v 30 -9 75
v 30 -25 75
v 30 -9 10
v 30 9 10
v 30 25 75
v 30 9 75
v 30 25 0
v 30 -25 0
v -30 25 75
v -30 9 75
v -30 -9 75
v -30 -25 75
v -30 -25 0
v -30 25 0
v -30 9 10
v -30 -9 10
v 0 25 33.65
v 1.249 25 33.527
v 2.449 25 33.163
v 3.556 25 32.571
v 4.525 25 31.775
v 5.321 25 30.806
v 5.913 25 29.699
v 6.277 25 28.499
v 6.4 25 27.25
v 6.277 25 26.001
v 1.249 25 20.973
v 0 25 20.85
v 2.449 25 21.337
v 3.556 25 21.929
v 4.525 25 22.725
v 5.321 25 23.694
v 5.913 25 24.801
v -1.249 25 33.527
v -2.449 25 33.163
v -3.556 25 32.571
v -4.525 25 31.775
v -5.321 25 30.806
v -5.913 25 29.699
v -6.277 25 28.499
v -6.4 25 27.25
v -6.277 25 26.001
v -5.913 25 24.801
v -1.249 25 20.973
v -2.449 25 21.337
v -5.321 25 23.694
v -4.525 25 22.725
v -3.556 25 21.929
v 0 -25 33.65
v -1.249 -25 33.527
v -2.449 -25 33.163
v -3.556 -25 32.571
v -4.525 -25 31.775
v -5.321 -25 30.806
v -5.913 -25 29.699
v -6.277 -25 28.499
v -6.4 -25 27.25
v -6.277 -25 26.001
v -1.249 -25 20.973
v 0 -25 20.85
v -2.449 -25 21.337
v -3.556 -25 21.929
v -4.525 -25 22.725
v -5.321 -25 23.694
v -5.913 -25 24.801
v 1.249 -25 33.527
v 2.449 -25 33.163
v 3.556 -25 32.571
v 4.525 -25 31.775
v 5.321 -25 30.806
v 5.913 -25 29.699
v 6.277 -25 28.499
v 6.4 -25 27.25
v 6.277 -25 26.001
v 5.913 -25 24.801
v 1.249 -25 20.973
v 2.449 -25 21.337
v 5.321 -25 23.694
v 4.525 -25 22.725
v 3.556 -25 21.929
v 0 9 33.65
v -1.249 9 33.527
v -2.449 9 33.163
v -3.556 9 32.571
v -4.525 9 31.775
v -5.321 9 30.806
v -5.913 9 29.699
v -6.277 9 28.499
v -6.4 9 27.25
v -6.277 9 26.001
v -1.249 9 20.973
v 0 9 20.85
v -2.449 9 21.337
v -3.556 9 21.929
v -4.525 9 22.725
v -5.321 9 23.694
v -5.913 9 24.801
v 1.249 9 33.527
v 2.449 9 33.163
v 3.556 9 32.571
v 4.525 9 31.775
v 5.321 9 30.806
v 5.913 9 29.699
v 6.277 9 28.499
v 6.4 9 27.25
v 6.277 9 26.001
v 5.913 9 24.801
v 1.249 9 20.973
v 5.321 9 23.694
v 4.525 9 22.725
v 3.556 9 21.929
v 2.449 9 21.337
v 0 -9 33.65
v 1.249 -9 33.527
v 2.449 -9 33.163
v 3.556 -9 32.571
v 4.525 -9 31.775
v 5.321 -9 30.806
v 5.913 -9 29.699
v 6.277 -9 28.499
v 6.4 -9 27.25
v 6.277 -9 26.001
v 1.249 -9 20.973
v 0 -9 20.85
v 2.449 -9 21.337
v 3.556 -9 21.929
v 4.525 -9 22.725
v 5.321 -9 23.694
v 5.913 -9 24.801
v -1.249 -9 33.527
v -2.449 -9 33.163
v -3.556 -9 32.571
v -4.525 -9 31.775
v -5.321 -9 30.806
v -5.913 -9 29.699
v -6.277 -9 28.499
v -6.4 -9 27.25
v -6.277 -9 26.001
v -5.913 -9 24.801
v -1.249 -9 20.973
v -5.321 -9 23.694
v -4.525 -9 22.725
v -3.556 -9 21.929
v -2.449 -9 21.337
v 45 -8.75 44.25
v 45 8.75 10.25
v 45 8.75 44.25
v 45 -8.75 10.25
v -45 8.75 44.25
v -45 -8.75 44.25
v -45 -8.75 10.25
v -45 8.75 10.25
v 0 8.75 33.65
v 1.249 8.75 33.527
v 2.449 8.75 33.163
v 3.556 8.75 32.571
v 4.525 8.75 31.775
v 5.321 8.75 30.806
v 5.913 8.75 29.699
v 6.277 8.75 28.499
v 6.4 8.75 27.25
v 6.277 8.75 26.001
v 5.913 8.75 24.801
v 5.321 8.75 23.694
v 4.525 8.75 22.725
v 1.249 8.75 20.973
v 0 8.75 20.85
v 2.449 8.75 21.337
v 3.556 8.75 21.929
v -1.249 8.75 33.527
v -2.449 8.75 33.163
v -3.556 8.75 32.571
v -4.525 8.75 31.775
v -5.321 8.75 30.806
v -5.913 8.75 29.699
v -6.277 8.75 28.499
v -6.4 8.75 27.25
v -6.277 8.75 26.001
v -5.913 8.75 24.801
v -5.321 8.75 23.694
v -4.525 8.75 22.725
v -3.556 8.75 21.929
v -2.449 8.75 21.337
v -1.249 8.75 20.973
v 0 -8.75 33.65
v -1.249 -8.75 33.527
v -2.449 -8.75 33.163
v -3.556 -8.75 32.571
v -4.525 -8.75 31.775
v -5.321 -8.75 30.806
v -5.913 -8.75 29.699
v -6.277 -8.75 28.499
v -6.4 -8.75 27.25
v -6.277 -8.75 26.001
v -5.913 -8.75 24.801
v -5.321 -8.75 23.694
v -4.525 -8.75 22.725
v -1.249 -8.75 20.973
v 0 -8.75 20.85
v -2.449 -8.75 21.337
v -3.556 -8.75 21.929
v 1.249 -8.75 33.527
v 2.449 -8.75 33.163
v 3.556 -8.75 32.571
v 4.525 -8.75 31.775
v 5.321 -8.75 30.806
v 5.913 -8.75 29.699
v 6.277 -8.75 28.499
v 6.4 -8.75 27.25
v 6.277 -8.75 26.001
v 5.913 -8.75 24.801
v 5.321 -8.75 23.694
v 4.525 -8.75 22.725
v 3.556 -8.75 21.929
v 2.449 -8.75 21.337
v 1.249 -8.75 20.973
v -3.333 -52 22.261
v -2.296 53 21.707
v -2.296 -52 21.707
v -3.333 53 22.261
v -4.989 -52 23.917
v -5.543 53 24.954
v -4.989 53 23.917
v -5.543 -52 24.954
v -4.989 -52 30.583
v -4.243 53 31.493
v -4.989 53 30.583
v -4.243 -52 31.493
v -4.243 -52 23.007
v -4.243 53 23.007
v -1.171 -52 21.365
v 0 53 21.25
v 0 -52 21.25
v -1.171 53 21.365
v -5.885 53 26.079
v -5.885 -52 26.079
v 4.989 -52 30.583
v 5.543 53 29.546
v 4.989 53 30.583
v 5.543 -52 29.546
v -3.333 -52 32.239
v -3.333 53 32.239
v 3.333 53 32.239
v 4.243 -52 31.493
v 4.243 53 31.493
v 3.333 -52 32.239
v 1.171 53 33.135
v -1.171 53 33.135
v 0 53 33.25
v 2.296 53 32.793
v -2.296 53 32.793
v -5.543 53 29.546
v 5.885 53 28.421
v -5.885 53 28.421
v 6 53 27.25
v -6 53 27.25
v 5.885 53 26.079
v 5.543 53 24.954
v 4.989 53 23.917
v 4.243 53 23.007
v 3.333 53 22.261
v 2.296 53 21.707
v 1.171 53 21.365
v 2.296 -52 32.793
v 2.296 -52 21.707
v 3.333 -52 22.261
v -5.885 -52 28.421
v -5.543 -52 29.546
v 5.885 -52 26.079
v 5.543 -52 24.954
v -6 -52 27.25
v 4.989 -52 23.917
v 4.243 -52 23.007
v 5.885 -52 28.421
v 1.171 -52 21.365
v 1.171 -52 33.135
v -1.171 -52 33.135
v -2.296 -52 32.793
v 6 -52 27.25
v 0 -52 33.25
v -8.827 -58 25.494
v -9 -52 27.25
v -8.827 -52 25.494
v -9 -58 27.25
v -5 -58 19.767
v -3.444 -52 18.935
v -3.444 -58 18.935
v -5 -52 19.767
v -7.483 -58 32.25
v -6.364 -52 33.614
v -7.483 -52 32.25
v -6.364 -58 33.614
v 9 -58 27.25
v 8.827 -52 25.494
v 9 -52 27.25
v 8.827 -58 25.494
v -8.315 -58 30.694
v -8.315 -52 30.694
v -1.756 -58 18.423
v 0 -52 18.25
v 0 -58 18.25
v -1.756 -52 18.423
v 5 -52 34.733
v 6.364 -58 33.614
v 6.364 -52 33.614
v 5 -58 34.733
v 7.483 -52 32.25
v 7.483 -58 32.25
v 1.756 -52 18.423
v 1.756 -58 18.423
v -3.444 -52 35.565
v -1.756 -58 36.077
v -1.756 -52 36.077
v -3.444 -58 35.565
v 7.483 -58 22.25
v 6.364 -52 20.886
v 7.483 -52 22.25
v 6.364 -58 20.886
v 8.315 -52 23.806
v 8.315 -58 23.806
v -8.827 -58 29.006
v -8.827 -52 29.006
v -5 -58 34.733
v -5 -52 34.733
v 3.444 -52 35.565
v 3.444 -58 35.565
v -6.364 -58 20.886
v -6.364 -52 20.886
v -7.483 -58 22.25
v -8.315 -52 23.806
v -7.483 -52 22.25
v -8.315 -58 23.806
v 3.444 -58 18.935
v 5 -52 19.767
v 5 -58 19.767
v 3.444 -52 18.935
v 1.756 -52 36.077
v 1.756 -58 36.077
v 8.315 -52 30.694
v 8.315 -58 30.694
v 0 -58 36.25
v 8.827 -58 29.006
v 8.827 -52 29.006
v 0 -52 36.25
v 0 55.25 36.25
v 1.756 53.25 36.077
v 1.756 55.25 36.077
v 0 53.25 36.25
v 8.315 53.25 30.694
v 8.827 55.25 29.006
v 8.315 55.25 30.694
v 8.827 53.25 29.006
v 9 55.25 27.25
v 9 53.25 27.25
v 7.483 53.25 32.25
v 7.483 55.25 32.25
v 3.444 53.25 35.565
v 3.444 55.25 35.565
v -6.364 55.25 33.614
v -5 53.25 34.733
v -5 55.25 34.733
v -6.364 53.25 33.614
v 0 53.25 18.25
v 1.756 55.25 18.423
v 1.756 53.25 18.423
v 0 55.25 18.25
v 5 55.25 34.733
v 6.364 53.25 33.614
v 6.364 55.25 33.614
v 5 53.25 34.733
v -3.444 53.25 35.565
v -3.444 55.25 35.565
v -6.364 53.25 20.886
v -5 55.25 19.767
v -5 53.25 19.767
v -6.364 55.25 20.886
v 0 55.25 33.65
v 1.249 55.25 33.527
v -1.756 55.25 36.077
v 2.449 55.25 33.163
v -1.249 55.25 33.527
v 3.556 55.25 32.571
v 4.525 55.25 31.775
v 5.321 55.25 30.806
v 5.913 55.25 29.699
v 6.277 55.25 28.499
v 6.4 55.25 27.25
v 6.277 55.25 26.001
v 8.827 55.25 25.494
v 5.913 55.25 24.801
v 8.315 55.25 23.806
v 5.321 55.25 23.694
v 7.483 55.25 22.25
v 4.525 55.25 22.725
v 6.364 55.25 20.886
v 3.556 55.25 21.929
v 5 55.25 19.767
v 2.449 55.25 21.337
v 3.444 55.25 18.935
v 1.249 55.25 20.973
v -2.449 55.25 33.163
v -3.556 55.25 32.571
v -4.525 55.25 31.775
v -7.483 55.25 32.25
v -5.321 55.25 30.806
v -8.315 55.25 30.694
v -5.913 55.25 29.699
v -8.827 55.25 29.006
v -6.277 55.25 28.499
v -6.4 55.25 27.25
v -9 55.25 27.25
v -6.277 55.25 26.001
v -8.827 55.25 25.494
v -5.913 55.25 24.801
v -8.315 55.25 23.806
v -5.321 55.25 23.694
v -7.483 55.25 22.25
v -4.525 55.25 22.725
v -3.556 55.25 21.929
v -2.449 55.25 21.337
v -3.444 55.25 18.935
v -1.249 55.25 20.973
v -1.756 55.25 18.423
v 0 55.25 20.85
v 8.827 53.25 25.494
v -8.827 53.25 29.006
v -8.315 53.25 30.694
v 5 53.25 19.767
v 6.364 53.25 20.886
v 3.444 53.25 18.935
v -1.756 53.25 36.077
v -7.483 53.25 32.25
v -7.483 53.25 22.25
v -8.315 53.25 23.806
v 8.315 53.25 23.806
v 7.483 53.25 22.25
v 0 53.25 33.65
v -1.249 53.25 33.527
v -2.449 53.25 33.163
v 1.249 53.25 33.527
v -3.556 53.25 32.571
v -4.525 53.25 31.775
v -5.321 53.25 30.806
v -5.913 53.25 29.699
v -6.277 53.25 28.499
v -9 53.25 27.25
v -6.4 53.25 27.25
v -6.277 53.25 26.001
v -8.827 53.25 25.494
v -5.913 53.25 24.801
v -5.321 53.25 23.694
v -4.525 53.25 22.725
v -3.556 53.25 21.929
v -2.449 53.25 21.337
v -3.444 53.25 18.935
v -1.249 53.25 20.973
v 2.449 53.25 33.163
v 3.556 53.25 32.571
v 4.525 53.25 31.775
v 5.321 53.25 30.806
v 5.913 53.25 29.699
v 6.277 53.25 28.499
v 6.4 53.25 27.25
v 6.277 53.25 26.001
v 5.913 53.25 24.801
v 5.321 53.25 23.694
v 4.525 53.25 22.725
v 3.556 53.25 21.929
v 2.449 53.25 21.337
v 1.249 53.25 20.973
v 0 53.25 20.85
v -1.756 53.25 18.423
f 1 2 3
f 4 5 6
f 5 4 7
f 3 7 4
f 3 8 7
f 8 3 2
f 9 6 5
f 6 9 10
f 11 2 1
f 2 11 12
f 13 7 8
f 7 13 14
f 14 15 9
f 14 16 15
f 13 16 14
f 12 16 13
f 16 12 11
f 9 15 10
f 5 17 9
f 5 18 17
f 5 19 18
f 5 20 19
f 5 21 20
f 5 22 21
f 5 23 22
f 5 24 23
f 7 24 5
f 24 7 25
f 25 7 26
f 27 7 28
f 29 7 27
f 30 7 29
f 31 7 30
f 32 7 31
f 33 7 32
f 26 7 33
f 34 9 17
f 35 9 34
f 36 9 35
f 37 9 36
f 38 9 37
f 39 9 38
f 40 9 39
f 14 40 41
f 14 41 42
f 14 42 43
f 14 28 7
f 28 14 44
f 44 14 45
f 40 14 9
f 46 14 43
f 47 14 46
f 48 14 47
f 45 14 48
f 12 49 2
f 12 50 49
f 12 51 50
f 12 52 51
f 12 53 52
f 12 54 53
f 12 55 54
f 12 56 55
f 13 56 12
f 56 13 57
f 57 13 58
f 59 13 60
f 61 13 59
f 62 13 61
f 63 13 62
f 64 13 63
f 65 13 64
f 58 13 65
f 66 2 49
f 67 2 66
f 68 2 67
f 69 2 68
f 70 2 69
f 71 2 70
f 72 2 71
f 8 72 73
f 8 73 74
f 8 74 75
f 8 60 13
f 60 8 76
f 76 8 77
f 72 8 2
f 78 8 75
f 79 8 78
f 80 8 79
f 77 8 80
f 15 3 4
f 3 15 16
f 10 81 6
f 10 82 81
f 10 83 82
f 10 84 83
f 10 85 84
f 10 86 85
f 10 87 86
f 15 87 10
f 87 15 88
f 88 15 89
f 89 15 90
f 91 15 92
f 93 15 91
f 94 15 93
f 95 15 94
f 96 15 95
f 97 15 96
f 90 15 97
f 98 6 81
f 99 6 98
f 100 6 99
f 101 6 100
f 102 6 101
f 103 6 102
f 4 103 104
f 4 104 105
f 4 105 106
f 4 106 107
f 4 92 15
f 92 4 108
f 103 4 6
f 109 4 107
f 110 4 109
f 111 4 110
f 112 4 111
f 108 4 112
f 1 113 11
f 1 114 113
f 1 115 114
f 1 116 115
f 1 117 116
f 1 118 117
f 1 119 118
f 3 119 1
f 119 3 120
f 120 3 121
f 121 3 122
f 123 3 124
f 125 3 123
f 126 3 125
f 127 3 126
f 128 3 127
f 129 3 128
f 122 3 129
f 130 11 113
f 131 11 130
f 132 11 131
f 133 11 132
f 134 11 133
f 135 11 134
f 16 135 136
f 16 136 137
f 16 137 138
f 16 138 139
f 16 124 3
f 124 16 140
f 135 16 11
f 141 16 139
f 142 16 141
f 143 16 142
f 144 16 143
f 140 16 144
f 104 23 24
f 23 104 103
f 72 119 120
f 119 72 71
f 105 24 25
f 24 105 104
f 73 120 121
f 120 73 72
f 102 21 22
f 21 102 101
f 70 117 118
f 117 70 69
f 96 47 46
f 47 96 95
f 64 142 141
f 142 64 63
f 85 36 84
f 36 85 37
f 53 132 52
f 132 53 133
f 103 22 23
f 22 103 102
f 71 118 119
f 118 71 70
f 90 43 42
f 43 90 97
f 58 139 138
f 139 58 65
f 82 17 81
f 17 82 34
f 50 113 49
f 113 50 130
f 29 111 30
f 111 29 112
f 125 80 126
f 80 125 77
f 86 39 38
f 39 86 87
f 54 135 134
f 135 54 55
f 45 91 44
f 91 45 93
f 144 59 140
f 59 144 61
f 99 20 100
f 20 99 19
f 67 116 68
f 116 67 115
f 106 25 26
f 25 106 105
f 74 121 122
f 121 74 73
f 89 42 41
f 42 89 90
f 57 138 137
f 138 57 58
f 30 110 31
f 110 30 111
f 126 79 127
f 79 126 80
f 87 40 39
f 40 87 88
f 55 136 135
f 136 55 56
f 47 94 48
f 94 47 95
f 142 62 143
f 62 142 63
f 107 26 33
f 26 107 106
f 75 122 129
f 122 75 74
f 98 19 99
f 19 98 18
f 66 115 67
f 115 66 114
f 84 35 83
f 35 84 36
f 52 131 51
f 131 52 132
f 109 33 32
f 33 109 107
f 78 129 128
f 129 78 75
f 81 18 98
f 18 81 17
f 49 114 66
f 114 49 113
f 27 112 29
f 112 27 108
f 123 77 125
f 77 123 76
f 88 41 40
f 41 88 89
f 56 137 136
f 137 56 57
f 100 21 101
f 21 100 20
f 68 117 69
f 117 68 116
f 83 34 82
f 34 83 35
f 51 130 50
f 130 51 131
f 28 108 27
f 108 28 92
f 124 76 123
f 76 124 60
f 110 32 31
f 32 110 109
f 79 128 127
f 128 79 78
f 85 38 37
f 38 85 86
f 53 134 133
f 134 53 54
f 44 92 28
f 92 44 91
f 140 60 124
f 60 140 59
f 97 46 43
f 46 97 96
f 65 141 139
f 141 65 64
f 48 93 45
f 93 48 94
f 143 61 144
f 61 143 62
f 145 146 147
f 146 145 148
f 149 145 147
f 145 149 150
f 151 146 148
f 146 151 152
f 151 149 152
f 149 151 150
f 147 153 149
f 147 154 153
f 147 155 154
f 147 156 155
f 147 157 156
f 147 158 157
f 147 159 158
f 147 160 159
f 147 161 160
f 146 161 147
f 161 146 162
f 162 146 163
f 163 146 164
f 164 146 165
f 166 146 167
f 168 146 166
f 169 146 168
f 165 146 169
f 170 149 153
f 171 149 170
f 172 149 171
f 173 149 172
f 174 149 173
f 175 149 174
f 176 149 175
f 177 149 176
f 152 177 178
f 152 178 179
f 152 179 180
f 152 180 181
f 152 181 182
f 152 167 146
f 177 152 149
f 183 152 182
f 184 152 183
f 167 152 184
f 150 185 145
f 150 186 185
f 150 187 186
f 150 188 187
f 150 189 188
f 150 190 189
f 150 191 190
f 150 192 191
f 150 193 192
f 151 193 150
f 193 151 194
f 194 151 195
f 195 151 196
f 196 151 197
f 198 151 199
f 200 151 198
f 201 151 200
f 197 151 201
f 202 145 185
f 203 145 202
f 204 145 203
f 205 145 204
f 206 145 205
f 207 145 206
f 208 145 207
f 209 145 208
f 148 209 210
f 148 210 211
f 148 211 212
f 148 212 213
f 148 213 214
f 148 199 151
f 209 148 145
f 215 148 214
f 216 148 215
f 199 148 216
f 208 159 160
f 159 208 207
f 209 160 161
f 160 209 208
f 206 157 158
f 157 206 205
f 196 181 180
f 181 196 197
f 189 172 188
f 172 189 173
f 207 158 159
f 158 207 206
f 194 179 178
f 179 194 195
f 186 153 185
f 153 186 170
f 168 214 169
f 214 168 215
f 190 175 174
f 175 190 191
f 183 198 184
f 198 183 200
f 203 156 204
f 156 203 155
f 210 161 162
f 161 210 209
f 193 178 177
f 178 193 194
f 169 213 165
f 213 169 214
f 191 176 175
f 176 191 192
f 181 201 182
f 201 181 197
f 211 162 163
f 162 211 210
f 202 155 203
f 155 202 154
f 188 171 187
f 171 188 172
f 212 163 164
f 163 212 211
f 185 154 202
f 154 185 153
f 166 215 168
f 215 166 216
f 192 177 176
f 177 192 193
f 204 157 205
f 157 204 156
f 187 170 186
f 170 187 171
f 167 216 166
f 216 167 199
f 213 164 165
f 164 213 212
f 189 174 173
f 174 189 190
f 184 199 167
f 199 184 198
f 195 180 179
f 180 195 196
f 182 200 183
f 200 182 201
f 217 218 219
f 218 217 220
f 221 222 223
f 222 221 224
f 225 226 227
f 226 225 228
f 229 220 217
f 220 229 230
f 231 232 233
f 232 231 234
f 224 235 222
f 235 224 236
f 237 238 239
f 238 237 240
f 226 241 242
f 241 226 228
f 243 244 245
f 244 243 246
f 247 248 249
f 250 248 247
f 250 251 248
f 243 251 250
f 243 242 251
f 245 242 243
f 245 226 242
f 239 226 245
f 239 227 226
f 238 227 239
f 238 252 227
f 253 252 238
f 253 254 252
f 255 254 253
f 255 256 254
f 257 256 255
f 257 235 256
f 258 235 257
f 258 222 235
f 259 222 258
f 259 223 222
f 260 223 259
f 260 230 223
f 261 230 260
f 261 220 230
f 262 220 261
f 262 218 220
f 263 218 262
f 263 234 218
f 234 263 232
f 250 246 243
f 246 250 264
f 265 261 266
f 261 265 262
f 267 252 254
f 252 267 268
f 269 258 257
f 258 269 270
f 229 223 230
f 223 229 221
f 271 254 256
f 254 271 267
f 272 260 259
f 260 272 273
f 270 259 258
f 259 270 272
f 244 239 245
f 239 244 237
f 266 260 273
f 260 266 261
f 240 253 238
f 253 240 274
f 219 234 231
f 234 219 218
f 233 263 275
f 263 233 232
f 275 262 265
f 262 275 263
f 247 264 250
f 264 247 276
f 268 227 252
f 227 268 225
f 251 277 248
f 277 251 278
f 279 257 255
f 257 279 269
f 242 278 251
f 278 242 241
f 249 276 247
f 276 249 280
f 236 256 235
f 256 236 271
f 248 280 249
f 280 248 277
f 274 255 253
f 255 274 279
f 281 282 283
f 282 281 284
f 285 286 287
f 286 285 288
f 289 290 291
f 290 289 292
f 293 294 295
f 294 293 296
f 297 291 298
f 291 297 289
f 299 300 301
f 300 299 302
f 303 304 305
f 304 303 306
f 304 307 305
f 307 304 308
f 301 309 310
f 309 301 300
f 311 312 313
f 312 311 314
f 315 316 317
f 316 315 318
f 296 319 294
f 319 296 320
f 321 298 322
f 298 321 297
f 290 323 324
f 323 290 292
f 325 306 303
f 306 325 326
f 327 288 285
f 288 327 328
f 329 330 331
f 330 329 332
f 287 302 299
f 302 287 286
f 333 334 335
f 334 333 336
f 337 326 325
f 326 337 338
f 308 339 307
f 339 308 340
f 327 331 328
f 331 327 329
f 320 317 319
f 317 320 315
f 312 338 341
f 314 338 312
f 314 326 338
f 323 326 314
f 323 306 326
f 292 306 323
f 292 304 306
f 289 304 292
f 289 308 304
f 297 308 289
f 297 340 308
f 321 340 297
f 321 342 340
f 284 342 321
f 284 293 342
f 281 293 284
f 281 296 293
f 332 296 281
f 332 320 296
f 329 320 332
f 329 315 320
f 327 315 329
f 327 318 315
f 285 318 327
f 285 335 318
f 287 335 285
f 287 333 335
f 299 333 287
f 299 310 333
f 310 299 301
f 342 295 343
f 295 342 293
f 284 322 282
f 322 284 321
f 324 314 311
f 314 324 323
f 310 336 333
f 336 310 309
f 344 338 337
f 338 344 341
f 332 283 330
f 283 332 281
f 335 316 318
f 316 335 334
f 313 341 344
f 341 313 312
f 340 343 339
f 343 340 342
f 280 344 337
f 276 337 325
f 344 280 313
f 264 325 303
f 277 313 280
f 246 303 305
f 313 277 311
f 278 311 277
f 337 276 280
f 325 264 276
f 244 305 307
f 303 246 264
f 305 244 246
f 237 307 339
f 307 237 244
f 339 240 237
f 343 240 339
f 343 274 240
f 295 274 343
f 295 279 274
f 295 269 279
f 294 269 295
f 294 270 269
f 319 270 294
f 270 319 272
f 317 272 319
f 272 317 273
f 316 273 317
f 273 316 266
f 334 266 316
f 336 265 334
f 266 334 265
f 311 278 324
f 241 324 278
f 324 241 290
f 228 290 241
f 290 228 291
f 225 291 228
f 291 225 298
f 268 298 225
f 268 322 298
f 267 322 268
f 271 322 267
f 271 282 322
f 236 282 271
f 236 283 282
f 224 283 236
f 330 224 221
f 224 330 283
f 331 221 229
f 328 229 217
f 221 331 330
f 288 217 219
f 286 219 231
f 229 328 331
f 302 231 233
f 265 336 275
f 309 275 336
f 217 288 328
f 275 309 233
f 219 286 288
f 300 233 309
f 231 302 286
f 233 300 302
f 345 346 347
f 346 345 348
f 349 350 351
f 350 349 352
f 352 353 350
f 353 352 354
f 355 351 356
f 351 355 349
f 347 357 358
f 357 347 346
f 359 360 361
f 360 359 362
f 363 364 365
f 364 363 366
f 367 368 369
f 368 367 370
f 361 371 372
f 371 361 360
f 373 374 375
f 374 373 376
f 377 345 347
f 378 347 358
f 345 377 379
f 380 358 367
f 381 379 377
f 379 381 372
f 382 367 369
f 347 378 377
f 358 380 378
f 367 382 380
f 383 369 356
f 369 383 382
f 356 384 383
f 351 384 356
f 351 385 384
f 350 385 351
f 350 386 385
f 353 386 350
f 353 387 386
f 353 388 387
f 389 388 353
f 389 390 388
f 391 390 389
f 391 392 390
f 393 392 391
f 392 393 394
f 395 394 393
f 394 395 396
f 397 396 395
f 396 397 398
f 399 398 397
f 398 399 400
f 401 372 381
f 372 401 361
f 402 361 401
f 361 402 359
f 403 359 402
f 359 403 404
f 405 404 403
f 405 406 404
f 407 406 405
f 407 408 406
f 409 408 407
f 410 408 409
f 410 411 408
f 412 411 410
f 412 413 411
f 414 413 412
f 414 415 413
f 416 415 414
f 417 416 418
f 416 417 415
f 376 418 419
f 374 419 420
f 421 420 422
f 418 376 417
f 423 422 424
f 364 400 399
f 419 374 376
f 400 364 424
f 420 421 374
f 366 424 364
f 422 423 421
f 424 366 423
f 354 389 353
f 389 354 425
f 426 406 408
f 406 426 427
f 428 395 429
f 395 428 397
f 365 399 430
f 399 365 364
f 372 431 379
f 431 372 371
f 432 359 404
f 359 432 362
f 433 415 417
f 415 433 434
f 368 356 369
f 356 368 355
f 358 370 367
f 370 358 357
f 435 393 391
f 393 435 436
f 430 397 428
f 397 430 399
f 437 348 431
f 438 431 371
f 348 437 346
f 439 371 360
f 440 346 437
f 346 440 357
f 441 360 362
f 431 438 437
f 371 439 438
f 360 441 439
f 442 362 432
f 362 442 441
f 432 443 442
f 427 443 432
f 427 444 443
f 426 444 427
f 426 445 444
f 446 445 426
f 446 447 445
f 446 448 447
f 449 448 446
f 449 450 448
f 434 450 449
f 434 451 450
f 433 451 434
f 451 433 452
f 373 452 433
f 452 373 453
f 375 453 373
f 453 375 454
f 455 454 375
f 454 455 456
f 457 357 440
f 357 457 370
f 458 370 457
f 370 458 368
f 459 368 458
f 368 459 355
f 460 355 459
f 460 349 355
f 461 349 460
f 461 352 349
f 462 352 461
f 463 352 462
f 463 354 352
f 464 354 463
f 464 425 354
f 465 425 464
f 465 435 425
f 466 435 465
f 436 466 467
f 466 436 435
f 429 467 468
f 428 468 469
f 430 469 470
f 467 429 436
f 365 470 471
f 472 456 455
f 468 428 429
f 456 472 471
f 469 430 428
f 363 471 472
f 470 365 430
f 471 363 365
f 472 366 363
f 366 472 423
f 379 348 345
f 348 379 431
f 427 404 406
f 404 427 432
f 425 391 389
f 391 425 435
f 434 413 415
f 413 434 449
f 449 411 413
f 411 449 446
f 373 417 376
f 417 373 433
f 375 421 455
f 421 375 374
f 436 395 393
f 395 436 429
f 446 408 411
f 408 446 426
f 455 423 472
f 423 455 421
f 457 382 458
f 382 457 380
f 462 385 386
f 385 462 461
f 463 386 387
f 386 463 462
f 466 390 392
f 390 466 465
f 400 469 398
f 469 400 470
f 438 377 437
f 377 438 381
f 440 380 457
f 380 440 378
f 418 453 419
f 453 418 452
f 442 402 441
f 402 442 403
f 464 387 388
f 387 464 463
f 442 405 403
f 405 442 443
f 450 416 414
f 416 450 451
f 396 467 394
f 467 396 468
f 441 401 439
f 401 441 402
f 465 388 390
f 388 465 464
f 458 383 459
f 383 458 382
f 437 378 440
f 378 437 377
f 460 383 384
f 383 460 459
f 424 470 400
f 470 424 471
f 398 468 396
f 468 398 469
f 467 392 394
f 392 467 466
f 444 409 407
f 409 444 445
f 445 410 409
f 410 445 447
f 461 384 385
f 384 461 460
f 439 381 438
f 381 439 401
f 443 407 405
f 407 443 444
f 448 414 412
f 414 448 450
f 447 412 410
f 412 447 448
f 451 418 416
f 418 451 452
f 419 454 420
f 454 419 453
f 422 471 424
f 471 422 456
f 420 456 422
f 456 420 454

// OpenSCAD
$fn = 32;

// ------------------------------------------------------------------------
// Clevis joint: 60 mm clevis, pin d12
// Every part is its own module, assembly() places them once.
// ------------------------------------------------------------------------

// --- part 1 ---
module clevis() {
  difference() {
    translate([-30, -25, 0]) cube([60, 50, 75]);
    translate([-31, -9, 10]) cube([62, 18, 66]);
    translate([0, 0, 27.25]) rotate([90, 0, 0]) cylinder(h = 52, d = 12.8, center = true);
  }
}

// --- part 2 ---
module eye() {
  difference() {
    translate([-45, -8.75, 0]) cube([90, 17.5, 34]);
    translate([0, 0, 17]) rotate([90, 0, 0]) cylinder(h = 19.5, d = 12.8, center = true);
  }
}

// --- part 3 ---
module pin() {
  rotate([0, 90, 0]) cylinder(h = 106, d = 12, center = true);
  translate([-58, 0, 0]) rotate([0, 90, 0]) cylinder(h = 6, d = 18);
}

// --- part 4 ---
module retainer() {
  difference() {
      translate([0, 0, 0]) cylinder(h = 2, d = 18);
      translate([0, 0, -1]) cylinder(h = 4, d = 12.8);
    }
}

// --- assembly ---
module assembly() {
  translate([0, 0, 0]) rotate([0, 0, 0]) clevis();
  translate([0, 0, 10.25]) rotate([0, 0, 0]) eye();
  translate([0, 0, 27.25]) rotate([0, 0, 90]) pin();
  translate([0, 55.25, 27.25]) rotate([90, 0, 0]) retainer();
}

assembly();
